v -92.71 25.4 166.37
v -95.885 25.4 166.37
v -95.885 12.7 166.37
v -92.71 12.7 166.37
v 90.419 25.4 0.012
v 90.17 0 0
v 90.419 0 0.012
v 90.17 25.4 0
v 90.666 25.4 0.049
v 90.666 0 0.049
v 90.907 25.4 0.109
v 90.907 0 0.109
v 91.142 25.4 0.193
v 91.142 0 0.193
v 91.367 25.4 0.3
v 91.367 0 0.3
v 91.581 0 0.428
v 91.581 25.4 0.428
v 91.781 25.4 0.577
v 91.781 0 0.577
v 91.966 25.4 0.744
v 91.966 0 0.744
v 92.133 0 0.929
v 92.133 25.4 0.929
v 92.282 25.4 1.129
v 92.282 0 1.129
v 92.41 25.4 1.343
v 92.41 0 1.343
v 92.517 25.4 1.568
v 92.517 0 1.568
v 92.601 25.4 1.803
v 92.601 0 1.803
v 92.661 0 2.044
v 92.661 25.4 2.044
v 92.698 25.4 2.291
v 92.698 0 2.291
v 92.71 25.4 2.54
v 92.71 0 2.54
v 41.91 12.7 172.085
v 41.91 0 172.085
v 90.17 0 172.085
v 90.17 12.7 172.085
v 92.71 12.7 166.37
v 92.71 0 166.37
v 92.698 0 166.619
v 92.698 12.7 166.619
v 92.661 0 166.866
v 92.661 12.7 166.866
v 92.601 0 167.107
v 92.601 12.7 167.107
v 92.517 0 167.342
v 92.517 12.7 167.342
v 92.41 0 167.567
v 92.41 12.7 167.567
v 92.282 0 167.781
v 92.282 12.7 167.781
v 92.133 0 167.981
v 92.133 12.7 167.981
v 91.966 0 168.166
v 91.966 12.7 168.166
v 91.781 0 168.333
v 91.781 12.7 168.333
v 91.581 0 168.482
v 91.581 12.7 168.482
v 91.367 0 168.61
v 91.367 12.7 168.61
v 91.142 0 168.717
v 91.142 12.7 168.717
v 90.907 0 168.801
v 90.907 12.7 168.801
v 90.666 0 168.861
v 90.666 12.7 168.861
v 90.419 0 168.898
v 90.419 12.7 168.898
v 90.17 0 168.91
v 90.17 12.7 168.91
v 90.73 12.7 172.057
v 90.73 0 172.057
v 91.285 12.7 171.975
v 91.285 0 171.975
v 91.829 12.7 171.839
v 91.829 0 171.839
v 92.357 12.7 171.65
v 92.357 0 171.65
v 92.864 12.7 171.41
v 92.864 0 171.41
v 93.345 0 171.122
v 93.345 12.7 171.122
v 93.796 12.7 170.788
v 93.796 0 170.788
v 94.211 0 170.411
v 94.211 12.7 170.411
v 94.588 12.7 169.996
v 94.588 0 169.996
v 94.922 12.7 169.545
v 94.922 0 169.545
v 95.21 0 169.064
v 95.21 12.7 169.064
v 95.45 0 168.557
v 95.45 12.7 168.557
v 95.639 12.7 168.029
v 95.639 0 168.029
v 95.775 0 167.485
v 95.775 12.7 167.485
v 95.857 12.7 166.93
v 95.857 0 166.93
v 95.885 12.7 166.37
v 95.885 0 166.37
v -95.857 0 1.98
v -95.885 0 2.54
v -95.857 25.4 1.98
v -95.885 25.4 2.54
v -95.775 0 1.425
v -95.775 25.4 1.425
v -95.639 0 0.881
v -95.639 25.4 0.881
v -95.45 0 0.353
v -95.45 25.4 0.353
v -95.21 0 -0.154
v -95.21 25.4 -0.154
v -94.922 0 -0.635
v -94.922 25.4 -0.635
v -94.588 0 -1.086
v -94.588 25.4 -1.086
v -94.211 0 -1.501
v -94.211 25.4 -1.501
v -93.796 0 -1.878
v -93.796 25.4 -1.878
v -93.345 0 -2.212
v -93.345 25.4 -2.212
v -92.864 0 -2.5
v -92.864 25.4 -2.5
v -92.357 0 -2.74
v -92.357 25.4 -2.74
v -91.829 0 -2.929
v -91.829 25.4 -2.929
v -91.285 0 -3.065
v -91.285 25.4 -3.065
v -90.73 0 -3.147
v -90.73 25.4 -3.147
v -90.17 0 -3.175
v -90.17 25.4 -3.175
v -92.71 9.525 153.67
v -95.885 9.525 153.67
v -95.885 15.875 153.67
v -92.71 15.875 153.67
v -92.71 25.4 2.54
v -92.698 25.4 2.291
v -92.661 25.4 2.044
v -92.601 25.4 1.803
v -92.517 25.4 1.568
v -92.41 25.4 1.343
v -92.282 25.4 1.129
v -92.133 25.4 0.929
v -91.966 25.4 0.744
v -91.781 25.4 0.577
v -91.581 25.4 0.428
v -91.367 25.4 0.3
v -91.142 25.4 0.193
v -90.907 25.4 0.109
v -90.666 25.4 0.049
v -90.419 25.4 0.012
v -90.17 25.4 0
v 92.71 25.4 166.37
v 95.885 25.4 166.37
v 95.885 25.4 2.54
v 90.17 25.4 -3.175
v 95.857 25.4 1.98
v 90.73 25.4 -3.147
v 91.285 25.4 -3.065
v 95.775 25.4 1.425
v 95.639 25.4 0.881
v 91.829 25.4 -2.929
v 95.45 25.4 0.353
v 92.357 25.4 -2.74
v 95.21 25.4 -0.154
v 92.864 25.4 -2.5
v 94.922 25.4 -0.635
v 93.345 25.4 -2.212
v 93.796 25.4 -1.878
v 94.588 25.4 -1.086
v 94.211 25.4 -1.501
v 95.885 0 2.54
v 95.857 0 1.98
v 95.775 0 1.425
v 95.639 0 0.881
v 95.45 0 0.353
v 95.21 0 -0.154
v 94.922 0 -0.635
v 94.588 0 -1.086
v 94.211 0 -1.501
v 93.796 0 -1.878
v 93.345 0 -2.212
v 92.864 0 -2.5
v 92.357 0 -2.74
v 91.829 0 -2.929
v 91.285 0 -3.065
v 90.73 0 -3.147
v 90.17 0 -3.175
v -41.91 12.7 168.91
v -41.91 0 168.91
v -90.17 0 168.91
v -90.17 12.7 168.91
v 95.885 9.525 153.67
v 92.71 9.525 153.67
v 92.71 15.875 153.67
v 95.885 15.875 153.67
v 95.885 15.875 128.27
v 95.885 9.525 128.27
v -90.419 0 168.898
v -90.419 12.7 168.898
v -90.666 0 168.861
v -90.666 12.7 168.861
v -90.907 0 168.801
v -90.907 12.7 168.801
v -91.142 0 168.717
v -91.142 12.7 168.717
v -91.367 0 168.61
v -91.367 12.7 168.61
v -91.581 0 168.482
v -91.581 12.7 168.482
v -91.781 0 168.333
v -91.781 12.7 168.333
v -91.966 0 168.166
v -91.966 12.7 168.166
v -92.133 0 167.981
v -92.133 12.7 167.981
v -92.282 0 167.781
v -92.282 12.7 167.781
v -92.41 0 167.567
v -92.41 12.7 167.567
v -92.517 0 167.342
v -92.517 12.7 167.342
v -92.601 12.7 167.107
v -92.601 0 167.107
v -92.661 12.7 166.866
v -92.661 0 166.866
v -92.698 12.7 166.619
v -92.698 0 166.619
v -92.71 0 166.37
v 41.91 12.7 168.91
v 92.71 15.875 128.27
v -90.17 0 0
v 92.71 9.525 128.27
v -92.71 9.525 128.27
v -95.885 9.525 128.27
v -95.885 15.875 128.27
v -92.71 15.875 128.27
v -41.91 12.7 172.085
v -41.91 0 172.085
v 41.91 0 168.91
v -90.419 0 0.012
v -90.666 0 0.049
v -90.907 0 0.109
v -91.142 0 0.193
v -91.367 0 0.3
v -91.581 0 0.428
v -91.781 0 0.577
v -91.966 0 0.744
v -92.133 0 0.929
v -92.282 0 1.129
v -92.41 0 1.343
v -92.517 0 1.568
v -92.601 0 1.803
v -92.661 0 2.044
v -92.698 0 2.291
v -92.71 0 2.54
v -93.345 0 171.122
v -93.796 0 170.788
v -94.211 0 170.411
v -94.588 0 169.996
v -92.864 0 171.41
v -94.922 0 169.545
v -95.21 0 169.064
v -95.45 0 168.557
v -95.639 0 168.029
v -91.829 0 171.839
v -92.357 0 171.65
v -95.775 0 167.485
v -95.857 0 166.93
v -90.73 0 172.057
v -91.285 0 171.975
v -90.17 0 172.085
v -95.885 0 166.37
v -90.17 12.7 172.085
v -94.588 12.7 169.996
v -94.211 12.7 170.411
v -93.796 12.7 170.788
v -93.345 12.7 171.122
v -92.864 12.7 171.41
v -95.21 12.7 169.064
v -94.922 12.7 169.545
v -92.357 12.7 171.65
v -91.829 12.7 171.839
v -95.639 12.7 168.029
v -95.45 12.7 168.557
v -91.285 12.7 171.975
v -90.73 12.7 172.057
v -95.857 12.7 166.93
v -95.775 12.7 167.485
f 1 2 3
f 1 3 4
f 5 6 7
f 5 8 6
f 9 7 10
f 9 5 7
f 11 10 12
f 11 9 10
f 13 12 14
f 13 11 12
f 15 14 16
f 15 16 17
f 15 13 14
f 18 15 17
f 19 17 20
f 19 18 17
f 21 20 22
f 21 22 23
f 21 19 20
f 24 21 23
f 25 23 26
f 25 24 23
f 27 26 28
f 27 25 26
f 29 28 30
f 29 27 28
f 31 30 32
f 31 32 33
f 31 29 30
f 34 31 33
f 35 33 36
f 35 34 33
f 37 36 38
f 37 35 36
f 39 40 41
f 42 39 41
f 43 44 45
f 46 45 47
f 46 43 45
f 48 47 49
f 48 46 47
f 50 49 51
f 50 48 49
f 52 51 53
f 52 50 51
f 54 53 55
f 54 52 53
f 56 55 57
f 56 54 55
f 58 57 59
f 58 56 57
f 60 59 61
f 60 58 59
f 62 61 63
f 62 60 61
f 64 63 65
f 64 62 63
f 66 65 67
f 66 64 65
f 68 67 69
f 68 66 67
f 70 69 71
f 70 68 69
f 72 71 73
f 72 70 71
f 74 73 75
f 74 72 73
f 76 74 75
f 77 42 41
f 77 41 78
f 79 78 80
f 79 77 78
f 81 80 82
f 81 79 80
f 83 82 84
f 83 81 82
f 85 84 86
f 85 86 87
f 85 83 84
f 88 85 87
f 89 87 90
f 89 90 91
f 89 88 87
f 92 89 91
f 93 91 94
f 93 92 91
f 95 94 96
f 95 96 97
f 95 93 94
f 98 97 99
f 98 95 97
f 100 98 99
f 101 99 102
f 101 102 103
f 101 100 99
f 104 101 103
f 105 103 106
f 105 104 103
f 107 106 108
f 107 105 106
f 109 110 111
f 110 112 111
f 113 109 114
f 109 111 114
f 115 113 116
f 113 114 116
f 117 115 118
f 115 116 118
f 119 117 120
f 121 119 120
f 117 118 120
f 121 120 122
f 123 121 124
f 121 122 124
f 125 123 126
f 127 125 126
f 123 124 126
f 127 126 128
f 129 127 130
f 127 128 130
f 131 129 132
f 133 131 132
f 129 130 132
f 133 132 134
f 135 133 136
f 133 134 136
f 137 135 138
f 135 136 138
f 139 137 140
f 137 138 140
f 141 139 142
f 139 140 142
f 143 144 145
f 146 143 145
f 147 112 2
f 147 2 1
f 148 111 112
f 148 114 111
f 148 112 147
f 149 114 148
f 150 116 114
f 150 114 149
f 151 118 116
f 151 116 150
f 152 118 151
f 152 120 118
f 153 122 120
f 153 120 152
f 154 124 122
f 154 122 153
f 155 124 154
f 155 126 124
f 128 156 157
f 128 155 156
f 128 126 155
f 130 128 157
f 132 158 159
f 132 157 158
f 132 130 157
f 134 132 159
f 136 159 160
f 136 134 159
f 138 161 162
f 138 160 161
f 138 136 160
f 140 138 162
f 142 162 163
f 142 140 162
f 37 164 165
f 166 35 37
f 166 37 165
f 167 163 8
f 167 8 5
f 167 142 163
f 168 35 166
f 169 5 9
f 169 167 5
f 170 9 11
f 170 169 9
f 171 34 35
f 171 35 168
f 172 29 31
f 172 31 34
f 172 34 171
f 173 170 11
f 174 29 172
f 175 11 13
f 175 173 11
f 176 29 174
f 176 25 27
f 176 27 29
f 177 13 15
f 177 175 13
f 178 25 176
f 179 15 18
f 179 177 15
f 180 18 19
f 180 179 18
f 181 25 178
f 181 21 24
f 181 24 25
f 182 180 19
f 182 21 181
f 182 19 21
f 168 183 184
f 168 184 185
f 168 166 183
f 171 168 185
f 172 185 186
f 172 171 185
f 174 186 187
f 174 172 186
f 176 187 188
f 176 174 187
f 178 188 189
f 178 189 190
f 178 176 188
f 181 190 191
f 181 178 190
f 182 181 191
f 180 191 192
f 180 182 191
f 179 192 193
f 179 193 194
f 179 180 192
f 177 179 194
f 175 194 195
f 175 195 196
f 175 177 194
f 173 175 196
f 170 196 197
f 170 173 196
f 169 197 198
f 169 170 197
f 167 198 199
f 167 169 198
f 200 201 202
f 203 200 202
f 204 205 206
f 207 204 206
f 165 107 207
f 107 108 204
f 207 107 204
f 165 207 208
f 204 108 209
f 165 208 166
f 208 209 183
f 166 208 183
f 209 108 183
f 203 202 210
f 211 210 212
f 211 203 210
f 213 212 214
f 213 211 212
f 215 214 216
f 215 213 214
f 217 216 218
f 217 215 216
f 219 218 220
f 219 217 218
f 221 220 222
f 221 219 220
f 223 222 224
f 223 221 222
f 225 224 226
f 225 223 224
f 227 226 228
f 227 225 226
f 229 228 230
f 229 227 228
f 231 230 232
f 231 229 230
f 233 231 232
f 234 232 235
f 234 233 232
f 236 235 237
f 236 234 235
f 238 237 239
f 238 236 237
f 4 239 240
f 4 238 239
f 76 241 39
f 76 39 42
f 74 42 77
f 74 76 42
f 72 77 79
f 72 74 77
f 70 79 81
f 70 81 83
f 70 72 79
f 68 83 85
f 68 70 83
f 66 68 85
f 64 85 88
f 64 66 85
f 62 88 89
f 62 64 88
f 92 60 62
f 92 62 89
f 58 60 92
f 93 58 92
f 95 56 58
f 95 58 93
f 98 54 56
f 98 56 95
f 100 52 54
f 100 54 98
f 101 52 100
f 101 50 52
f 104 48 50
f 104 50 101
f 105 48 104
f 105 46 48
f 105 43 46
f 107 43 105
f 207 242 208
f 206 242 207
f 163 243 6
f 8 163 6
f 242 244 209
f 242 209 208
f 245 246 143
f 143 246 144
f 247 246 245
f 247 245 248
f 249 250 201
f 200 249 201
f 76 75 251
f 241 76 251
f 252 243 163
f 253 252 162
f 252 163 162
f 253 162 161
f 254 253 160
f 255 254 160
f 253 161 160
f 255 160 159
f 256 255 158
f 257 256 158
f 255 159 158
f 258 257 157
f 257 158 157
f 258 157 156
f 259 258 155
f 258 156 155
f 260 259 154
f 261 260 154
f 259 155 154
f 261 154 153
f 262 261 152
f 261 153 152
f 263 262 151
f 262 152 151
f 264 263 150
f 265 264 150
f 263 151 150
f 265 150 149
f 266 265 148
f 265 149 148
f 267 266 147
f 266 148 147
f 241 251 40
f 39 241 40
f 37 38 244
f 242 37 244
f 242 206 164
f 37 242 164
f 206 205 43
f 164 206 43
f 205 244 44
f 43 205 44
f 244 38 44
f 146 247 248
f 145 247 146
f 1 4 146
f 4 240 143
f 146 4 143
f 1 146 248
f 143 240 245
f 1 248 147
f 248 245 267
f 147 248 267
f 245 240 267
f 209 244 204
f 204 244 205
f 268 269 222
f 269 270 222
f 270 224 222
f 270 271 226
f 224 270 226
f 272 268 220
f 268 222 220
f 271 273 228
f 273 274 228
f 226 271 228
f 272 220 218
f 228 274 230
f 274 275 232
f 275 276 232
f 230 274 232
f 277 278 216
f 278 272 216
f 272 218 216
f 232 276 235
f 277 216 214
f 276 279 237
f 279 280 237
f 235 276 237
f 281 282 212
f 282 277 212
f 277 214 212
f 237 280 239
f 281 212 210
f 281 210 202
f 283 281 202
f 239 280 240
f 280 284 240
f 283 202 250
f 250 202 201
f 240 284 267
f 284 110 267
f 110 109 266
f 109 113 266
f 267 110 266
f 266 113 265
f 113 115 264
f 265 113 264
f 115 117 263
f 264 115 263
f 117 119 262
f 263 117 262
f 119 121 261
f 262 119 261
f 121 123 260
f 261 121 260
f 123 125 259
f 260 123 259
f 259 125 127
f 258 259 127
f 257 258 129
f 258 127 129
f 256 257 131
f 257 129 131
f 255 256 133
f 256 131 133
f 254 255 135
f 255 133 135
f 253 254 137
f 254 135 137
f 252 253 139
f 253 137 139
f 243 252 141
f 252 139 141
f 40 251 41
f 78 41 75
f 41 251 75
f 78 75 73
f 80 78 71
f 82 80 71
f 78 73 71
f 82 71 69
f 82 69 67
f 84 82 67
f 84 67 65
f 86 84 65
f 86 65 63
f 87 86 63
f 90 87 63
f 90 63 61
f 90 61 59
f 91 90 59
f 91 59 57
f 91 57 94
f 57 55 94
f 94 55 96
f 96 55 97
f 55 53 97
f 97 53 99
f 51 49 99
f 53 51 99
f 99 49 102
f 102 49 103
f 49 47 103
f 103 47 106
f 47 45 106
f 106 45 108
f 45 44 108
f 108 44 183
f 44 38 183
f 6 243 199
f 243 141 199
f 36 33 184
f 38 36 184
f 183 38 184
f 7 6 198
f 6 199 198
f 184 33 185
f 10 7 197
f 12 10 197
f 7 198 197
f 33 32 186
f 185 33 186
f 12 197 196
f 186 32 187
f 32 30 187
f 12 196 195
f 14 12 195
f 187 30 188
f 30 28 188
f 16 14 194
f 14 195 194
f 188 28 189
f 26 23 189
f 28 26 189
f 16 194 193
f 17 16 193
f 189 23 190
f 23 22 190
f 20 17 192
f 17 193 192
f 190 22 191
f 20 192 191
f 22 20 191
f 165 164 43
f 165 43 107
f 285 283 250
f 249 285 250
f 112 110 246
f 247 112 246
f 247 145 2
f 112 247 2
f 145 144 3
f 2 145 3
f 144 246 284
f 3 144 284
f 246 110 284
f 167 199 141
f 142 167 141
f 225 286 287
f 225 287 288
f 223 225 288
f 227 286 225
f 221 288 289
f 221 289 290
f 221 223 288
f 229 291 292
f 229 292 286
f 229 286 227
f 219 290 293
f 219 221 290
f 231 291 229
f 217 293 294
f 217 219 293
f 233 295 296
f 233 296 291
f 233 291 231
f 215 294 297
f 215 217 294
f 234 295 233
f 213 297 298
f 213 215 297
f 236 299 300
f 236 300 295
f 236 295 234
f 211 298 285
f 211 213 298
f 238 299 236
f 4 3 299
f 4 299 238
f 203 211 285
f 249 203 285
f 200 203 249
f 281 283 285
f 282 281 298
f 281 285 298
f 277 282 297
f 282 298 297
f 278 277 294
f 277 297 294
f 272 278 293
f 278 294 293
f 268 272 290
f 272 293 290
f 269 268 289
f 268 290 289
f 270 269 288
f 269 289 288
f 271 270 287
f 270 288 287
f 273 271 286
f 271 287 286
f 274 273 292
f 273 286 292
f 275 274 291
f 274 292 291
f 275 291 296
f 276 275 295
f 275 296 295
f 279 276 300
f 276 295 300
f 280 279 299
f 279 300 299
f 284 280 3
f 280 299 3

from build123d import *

# Parameters (mm, degrees)
BOSS_EXTRUDE1_DEPTH = 25.4
FILLET1_R           = 2.54
FILLET2_R           = 5.715
SKETCH2_W           = 191.77
SKETCH2_H           = 5.715
CUT_EXTRUDE1_DEPTH  = 12.7
CUT_EXTRUDE2_REACH  = 260.91
SKETCH3_W           = 25.4
SKETCH3_H           = 6.35


with BuildPart() as part:
    # Sketch1 → Boss-Extrude1 (new body)
    with BuildSketch(Plane(origin=(0, 0, 0), x_dir=(1, 0, 0), z_dir=(0, 1, 0))):
        Polygon((-92.71, 0), (92.71, 0), (92.71, -168.91), (41.91, -168.91), (41.91, -172.085), (95.885, -172.085), (95.885, 3.175), (-95.885, 3.175), (-95.885, -172.085), (-41.91, -172.085), (-41.91, -168.91), (-92.71, -168.91), align=None)
    extrude(amount=BOSS_EXTRUDE1_DEPTH)

    # Fillet1
    fillet1_edges = [part.edges().sort_by_distance(p)[0] for p in [
        (92.71, 12.7, 168.91),
        (92.71, 12.7, 0),
        (-92.71, 12.7, 0),
        (-92.71, 12.7, 168.91),
    ]]
    fillet(fillet1_edges, radius=FILLET1_R)

    # Fillet2
    fillet2_edges = [part.edges().sort_by_distance(p)[0] for p in [
        (-95.885, 12.7, -3.175),
        (95.885, 12.7, -3.175),
        (95.885, 12.7, 172.085),
        (-95.885, 12.7, 172.085),
    ]]
    fillet(fillet2_edges, radius=FILLET2_R)

    # Sketch2 → Cut-Extrude1 (cut)
    with BuildSketch(Plane(origin=(0, 25.4, 0), x_dir=(1, 0, 0), z_dir=(0, 1, 0))):
        with Locations((0, -169.2275)):
            Rectangle(SKETCH2_W, SKETCH2_H)
    extrude(amount=-CUT_EXTRUDE1_DEPTH, mode=Mode.SUBTRACT)

    # Cut-Extrude2: up to this face of the body (flat: up to its plane)
    cut_extrude2_end = Plane(part.part.faces().sort_by_distance((95.885, 12.7, 84.455))[0])
    # Sketch3 → Cut-Extrude2 (cut, up to the picked face)
    with BuildSketch(Plane.ZY.offset(95.885), mode=Mode.PRIVATE) as cut_extrude2_sk1:
        with Locations((140.97, 12.7)):
            Rectangle(SKETCH3_W, SKETCH3_H)
    cut_extrude2_tool1 = split(extrude(cut_extrude2_sk1.sketch, amount=-CUT_EXTRUDE2_REACH, mode=Mode.PRIVATE), bisect_by=cut_extrude2_end, keep=Keep.BOTH, mode=Mode.PRIVATE)
    add(cut_extrude2_tool1.solids().sort_by(Axis((-95.885, 12.7, 140.97), (1, 0, 0)))[0], mode=Mode.SUBTRACT)


solid = part.part
